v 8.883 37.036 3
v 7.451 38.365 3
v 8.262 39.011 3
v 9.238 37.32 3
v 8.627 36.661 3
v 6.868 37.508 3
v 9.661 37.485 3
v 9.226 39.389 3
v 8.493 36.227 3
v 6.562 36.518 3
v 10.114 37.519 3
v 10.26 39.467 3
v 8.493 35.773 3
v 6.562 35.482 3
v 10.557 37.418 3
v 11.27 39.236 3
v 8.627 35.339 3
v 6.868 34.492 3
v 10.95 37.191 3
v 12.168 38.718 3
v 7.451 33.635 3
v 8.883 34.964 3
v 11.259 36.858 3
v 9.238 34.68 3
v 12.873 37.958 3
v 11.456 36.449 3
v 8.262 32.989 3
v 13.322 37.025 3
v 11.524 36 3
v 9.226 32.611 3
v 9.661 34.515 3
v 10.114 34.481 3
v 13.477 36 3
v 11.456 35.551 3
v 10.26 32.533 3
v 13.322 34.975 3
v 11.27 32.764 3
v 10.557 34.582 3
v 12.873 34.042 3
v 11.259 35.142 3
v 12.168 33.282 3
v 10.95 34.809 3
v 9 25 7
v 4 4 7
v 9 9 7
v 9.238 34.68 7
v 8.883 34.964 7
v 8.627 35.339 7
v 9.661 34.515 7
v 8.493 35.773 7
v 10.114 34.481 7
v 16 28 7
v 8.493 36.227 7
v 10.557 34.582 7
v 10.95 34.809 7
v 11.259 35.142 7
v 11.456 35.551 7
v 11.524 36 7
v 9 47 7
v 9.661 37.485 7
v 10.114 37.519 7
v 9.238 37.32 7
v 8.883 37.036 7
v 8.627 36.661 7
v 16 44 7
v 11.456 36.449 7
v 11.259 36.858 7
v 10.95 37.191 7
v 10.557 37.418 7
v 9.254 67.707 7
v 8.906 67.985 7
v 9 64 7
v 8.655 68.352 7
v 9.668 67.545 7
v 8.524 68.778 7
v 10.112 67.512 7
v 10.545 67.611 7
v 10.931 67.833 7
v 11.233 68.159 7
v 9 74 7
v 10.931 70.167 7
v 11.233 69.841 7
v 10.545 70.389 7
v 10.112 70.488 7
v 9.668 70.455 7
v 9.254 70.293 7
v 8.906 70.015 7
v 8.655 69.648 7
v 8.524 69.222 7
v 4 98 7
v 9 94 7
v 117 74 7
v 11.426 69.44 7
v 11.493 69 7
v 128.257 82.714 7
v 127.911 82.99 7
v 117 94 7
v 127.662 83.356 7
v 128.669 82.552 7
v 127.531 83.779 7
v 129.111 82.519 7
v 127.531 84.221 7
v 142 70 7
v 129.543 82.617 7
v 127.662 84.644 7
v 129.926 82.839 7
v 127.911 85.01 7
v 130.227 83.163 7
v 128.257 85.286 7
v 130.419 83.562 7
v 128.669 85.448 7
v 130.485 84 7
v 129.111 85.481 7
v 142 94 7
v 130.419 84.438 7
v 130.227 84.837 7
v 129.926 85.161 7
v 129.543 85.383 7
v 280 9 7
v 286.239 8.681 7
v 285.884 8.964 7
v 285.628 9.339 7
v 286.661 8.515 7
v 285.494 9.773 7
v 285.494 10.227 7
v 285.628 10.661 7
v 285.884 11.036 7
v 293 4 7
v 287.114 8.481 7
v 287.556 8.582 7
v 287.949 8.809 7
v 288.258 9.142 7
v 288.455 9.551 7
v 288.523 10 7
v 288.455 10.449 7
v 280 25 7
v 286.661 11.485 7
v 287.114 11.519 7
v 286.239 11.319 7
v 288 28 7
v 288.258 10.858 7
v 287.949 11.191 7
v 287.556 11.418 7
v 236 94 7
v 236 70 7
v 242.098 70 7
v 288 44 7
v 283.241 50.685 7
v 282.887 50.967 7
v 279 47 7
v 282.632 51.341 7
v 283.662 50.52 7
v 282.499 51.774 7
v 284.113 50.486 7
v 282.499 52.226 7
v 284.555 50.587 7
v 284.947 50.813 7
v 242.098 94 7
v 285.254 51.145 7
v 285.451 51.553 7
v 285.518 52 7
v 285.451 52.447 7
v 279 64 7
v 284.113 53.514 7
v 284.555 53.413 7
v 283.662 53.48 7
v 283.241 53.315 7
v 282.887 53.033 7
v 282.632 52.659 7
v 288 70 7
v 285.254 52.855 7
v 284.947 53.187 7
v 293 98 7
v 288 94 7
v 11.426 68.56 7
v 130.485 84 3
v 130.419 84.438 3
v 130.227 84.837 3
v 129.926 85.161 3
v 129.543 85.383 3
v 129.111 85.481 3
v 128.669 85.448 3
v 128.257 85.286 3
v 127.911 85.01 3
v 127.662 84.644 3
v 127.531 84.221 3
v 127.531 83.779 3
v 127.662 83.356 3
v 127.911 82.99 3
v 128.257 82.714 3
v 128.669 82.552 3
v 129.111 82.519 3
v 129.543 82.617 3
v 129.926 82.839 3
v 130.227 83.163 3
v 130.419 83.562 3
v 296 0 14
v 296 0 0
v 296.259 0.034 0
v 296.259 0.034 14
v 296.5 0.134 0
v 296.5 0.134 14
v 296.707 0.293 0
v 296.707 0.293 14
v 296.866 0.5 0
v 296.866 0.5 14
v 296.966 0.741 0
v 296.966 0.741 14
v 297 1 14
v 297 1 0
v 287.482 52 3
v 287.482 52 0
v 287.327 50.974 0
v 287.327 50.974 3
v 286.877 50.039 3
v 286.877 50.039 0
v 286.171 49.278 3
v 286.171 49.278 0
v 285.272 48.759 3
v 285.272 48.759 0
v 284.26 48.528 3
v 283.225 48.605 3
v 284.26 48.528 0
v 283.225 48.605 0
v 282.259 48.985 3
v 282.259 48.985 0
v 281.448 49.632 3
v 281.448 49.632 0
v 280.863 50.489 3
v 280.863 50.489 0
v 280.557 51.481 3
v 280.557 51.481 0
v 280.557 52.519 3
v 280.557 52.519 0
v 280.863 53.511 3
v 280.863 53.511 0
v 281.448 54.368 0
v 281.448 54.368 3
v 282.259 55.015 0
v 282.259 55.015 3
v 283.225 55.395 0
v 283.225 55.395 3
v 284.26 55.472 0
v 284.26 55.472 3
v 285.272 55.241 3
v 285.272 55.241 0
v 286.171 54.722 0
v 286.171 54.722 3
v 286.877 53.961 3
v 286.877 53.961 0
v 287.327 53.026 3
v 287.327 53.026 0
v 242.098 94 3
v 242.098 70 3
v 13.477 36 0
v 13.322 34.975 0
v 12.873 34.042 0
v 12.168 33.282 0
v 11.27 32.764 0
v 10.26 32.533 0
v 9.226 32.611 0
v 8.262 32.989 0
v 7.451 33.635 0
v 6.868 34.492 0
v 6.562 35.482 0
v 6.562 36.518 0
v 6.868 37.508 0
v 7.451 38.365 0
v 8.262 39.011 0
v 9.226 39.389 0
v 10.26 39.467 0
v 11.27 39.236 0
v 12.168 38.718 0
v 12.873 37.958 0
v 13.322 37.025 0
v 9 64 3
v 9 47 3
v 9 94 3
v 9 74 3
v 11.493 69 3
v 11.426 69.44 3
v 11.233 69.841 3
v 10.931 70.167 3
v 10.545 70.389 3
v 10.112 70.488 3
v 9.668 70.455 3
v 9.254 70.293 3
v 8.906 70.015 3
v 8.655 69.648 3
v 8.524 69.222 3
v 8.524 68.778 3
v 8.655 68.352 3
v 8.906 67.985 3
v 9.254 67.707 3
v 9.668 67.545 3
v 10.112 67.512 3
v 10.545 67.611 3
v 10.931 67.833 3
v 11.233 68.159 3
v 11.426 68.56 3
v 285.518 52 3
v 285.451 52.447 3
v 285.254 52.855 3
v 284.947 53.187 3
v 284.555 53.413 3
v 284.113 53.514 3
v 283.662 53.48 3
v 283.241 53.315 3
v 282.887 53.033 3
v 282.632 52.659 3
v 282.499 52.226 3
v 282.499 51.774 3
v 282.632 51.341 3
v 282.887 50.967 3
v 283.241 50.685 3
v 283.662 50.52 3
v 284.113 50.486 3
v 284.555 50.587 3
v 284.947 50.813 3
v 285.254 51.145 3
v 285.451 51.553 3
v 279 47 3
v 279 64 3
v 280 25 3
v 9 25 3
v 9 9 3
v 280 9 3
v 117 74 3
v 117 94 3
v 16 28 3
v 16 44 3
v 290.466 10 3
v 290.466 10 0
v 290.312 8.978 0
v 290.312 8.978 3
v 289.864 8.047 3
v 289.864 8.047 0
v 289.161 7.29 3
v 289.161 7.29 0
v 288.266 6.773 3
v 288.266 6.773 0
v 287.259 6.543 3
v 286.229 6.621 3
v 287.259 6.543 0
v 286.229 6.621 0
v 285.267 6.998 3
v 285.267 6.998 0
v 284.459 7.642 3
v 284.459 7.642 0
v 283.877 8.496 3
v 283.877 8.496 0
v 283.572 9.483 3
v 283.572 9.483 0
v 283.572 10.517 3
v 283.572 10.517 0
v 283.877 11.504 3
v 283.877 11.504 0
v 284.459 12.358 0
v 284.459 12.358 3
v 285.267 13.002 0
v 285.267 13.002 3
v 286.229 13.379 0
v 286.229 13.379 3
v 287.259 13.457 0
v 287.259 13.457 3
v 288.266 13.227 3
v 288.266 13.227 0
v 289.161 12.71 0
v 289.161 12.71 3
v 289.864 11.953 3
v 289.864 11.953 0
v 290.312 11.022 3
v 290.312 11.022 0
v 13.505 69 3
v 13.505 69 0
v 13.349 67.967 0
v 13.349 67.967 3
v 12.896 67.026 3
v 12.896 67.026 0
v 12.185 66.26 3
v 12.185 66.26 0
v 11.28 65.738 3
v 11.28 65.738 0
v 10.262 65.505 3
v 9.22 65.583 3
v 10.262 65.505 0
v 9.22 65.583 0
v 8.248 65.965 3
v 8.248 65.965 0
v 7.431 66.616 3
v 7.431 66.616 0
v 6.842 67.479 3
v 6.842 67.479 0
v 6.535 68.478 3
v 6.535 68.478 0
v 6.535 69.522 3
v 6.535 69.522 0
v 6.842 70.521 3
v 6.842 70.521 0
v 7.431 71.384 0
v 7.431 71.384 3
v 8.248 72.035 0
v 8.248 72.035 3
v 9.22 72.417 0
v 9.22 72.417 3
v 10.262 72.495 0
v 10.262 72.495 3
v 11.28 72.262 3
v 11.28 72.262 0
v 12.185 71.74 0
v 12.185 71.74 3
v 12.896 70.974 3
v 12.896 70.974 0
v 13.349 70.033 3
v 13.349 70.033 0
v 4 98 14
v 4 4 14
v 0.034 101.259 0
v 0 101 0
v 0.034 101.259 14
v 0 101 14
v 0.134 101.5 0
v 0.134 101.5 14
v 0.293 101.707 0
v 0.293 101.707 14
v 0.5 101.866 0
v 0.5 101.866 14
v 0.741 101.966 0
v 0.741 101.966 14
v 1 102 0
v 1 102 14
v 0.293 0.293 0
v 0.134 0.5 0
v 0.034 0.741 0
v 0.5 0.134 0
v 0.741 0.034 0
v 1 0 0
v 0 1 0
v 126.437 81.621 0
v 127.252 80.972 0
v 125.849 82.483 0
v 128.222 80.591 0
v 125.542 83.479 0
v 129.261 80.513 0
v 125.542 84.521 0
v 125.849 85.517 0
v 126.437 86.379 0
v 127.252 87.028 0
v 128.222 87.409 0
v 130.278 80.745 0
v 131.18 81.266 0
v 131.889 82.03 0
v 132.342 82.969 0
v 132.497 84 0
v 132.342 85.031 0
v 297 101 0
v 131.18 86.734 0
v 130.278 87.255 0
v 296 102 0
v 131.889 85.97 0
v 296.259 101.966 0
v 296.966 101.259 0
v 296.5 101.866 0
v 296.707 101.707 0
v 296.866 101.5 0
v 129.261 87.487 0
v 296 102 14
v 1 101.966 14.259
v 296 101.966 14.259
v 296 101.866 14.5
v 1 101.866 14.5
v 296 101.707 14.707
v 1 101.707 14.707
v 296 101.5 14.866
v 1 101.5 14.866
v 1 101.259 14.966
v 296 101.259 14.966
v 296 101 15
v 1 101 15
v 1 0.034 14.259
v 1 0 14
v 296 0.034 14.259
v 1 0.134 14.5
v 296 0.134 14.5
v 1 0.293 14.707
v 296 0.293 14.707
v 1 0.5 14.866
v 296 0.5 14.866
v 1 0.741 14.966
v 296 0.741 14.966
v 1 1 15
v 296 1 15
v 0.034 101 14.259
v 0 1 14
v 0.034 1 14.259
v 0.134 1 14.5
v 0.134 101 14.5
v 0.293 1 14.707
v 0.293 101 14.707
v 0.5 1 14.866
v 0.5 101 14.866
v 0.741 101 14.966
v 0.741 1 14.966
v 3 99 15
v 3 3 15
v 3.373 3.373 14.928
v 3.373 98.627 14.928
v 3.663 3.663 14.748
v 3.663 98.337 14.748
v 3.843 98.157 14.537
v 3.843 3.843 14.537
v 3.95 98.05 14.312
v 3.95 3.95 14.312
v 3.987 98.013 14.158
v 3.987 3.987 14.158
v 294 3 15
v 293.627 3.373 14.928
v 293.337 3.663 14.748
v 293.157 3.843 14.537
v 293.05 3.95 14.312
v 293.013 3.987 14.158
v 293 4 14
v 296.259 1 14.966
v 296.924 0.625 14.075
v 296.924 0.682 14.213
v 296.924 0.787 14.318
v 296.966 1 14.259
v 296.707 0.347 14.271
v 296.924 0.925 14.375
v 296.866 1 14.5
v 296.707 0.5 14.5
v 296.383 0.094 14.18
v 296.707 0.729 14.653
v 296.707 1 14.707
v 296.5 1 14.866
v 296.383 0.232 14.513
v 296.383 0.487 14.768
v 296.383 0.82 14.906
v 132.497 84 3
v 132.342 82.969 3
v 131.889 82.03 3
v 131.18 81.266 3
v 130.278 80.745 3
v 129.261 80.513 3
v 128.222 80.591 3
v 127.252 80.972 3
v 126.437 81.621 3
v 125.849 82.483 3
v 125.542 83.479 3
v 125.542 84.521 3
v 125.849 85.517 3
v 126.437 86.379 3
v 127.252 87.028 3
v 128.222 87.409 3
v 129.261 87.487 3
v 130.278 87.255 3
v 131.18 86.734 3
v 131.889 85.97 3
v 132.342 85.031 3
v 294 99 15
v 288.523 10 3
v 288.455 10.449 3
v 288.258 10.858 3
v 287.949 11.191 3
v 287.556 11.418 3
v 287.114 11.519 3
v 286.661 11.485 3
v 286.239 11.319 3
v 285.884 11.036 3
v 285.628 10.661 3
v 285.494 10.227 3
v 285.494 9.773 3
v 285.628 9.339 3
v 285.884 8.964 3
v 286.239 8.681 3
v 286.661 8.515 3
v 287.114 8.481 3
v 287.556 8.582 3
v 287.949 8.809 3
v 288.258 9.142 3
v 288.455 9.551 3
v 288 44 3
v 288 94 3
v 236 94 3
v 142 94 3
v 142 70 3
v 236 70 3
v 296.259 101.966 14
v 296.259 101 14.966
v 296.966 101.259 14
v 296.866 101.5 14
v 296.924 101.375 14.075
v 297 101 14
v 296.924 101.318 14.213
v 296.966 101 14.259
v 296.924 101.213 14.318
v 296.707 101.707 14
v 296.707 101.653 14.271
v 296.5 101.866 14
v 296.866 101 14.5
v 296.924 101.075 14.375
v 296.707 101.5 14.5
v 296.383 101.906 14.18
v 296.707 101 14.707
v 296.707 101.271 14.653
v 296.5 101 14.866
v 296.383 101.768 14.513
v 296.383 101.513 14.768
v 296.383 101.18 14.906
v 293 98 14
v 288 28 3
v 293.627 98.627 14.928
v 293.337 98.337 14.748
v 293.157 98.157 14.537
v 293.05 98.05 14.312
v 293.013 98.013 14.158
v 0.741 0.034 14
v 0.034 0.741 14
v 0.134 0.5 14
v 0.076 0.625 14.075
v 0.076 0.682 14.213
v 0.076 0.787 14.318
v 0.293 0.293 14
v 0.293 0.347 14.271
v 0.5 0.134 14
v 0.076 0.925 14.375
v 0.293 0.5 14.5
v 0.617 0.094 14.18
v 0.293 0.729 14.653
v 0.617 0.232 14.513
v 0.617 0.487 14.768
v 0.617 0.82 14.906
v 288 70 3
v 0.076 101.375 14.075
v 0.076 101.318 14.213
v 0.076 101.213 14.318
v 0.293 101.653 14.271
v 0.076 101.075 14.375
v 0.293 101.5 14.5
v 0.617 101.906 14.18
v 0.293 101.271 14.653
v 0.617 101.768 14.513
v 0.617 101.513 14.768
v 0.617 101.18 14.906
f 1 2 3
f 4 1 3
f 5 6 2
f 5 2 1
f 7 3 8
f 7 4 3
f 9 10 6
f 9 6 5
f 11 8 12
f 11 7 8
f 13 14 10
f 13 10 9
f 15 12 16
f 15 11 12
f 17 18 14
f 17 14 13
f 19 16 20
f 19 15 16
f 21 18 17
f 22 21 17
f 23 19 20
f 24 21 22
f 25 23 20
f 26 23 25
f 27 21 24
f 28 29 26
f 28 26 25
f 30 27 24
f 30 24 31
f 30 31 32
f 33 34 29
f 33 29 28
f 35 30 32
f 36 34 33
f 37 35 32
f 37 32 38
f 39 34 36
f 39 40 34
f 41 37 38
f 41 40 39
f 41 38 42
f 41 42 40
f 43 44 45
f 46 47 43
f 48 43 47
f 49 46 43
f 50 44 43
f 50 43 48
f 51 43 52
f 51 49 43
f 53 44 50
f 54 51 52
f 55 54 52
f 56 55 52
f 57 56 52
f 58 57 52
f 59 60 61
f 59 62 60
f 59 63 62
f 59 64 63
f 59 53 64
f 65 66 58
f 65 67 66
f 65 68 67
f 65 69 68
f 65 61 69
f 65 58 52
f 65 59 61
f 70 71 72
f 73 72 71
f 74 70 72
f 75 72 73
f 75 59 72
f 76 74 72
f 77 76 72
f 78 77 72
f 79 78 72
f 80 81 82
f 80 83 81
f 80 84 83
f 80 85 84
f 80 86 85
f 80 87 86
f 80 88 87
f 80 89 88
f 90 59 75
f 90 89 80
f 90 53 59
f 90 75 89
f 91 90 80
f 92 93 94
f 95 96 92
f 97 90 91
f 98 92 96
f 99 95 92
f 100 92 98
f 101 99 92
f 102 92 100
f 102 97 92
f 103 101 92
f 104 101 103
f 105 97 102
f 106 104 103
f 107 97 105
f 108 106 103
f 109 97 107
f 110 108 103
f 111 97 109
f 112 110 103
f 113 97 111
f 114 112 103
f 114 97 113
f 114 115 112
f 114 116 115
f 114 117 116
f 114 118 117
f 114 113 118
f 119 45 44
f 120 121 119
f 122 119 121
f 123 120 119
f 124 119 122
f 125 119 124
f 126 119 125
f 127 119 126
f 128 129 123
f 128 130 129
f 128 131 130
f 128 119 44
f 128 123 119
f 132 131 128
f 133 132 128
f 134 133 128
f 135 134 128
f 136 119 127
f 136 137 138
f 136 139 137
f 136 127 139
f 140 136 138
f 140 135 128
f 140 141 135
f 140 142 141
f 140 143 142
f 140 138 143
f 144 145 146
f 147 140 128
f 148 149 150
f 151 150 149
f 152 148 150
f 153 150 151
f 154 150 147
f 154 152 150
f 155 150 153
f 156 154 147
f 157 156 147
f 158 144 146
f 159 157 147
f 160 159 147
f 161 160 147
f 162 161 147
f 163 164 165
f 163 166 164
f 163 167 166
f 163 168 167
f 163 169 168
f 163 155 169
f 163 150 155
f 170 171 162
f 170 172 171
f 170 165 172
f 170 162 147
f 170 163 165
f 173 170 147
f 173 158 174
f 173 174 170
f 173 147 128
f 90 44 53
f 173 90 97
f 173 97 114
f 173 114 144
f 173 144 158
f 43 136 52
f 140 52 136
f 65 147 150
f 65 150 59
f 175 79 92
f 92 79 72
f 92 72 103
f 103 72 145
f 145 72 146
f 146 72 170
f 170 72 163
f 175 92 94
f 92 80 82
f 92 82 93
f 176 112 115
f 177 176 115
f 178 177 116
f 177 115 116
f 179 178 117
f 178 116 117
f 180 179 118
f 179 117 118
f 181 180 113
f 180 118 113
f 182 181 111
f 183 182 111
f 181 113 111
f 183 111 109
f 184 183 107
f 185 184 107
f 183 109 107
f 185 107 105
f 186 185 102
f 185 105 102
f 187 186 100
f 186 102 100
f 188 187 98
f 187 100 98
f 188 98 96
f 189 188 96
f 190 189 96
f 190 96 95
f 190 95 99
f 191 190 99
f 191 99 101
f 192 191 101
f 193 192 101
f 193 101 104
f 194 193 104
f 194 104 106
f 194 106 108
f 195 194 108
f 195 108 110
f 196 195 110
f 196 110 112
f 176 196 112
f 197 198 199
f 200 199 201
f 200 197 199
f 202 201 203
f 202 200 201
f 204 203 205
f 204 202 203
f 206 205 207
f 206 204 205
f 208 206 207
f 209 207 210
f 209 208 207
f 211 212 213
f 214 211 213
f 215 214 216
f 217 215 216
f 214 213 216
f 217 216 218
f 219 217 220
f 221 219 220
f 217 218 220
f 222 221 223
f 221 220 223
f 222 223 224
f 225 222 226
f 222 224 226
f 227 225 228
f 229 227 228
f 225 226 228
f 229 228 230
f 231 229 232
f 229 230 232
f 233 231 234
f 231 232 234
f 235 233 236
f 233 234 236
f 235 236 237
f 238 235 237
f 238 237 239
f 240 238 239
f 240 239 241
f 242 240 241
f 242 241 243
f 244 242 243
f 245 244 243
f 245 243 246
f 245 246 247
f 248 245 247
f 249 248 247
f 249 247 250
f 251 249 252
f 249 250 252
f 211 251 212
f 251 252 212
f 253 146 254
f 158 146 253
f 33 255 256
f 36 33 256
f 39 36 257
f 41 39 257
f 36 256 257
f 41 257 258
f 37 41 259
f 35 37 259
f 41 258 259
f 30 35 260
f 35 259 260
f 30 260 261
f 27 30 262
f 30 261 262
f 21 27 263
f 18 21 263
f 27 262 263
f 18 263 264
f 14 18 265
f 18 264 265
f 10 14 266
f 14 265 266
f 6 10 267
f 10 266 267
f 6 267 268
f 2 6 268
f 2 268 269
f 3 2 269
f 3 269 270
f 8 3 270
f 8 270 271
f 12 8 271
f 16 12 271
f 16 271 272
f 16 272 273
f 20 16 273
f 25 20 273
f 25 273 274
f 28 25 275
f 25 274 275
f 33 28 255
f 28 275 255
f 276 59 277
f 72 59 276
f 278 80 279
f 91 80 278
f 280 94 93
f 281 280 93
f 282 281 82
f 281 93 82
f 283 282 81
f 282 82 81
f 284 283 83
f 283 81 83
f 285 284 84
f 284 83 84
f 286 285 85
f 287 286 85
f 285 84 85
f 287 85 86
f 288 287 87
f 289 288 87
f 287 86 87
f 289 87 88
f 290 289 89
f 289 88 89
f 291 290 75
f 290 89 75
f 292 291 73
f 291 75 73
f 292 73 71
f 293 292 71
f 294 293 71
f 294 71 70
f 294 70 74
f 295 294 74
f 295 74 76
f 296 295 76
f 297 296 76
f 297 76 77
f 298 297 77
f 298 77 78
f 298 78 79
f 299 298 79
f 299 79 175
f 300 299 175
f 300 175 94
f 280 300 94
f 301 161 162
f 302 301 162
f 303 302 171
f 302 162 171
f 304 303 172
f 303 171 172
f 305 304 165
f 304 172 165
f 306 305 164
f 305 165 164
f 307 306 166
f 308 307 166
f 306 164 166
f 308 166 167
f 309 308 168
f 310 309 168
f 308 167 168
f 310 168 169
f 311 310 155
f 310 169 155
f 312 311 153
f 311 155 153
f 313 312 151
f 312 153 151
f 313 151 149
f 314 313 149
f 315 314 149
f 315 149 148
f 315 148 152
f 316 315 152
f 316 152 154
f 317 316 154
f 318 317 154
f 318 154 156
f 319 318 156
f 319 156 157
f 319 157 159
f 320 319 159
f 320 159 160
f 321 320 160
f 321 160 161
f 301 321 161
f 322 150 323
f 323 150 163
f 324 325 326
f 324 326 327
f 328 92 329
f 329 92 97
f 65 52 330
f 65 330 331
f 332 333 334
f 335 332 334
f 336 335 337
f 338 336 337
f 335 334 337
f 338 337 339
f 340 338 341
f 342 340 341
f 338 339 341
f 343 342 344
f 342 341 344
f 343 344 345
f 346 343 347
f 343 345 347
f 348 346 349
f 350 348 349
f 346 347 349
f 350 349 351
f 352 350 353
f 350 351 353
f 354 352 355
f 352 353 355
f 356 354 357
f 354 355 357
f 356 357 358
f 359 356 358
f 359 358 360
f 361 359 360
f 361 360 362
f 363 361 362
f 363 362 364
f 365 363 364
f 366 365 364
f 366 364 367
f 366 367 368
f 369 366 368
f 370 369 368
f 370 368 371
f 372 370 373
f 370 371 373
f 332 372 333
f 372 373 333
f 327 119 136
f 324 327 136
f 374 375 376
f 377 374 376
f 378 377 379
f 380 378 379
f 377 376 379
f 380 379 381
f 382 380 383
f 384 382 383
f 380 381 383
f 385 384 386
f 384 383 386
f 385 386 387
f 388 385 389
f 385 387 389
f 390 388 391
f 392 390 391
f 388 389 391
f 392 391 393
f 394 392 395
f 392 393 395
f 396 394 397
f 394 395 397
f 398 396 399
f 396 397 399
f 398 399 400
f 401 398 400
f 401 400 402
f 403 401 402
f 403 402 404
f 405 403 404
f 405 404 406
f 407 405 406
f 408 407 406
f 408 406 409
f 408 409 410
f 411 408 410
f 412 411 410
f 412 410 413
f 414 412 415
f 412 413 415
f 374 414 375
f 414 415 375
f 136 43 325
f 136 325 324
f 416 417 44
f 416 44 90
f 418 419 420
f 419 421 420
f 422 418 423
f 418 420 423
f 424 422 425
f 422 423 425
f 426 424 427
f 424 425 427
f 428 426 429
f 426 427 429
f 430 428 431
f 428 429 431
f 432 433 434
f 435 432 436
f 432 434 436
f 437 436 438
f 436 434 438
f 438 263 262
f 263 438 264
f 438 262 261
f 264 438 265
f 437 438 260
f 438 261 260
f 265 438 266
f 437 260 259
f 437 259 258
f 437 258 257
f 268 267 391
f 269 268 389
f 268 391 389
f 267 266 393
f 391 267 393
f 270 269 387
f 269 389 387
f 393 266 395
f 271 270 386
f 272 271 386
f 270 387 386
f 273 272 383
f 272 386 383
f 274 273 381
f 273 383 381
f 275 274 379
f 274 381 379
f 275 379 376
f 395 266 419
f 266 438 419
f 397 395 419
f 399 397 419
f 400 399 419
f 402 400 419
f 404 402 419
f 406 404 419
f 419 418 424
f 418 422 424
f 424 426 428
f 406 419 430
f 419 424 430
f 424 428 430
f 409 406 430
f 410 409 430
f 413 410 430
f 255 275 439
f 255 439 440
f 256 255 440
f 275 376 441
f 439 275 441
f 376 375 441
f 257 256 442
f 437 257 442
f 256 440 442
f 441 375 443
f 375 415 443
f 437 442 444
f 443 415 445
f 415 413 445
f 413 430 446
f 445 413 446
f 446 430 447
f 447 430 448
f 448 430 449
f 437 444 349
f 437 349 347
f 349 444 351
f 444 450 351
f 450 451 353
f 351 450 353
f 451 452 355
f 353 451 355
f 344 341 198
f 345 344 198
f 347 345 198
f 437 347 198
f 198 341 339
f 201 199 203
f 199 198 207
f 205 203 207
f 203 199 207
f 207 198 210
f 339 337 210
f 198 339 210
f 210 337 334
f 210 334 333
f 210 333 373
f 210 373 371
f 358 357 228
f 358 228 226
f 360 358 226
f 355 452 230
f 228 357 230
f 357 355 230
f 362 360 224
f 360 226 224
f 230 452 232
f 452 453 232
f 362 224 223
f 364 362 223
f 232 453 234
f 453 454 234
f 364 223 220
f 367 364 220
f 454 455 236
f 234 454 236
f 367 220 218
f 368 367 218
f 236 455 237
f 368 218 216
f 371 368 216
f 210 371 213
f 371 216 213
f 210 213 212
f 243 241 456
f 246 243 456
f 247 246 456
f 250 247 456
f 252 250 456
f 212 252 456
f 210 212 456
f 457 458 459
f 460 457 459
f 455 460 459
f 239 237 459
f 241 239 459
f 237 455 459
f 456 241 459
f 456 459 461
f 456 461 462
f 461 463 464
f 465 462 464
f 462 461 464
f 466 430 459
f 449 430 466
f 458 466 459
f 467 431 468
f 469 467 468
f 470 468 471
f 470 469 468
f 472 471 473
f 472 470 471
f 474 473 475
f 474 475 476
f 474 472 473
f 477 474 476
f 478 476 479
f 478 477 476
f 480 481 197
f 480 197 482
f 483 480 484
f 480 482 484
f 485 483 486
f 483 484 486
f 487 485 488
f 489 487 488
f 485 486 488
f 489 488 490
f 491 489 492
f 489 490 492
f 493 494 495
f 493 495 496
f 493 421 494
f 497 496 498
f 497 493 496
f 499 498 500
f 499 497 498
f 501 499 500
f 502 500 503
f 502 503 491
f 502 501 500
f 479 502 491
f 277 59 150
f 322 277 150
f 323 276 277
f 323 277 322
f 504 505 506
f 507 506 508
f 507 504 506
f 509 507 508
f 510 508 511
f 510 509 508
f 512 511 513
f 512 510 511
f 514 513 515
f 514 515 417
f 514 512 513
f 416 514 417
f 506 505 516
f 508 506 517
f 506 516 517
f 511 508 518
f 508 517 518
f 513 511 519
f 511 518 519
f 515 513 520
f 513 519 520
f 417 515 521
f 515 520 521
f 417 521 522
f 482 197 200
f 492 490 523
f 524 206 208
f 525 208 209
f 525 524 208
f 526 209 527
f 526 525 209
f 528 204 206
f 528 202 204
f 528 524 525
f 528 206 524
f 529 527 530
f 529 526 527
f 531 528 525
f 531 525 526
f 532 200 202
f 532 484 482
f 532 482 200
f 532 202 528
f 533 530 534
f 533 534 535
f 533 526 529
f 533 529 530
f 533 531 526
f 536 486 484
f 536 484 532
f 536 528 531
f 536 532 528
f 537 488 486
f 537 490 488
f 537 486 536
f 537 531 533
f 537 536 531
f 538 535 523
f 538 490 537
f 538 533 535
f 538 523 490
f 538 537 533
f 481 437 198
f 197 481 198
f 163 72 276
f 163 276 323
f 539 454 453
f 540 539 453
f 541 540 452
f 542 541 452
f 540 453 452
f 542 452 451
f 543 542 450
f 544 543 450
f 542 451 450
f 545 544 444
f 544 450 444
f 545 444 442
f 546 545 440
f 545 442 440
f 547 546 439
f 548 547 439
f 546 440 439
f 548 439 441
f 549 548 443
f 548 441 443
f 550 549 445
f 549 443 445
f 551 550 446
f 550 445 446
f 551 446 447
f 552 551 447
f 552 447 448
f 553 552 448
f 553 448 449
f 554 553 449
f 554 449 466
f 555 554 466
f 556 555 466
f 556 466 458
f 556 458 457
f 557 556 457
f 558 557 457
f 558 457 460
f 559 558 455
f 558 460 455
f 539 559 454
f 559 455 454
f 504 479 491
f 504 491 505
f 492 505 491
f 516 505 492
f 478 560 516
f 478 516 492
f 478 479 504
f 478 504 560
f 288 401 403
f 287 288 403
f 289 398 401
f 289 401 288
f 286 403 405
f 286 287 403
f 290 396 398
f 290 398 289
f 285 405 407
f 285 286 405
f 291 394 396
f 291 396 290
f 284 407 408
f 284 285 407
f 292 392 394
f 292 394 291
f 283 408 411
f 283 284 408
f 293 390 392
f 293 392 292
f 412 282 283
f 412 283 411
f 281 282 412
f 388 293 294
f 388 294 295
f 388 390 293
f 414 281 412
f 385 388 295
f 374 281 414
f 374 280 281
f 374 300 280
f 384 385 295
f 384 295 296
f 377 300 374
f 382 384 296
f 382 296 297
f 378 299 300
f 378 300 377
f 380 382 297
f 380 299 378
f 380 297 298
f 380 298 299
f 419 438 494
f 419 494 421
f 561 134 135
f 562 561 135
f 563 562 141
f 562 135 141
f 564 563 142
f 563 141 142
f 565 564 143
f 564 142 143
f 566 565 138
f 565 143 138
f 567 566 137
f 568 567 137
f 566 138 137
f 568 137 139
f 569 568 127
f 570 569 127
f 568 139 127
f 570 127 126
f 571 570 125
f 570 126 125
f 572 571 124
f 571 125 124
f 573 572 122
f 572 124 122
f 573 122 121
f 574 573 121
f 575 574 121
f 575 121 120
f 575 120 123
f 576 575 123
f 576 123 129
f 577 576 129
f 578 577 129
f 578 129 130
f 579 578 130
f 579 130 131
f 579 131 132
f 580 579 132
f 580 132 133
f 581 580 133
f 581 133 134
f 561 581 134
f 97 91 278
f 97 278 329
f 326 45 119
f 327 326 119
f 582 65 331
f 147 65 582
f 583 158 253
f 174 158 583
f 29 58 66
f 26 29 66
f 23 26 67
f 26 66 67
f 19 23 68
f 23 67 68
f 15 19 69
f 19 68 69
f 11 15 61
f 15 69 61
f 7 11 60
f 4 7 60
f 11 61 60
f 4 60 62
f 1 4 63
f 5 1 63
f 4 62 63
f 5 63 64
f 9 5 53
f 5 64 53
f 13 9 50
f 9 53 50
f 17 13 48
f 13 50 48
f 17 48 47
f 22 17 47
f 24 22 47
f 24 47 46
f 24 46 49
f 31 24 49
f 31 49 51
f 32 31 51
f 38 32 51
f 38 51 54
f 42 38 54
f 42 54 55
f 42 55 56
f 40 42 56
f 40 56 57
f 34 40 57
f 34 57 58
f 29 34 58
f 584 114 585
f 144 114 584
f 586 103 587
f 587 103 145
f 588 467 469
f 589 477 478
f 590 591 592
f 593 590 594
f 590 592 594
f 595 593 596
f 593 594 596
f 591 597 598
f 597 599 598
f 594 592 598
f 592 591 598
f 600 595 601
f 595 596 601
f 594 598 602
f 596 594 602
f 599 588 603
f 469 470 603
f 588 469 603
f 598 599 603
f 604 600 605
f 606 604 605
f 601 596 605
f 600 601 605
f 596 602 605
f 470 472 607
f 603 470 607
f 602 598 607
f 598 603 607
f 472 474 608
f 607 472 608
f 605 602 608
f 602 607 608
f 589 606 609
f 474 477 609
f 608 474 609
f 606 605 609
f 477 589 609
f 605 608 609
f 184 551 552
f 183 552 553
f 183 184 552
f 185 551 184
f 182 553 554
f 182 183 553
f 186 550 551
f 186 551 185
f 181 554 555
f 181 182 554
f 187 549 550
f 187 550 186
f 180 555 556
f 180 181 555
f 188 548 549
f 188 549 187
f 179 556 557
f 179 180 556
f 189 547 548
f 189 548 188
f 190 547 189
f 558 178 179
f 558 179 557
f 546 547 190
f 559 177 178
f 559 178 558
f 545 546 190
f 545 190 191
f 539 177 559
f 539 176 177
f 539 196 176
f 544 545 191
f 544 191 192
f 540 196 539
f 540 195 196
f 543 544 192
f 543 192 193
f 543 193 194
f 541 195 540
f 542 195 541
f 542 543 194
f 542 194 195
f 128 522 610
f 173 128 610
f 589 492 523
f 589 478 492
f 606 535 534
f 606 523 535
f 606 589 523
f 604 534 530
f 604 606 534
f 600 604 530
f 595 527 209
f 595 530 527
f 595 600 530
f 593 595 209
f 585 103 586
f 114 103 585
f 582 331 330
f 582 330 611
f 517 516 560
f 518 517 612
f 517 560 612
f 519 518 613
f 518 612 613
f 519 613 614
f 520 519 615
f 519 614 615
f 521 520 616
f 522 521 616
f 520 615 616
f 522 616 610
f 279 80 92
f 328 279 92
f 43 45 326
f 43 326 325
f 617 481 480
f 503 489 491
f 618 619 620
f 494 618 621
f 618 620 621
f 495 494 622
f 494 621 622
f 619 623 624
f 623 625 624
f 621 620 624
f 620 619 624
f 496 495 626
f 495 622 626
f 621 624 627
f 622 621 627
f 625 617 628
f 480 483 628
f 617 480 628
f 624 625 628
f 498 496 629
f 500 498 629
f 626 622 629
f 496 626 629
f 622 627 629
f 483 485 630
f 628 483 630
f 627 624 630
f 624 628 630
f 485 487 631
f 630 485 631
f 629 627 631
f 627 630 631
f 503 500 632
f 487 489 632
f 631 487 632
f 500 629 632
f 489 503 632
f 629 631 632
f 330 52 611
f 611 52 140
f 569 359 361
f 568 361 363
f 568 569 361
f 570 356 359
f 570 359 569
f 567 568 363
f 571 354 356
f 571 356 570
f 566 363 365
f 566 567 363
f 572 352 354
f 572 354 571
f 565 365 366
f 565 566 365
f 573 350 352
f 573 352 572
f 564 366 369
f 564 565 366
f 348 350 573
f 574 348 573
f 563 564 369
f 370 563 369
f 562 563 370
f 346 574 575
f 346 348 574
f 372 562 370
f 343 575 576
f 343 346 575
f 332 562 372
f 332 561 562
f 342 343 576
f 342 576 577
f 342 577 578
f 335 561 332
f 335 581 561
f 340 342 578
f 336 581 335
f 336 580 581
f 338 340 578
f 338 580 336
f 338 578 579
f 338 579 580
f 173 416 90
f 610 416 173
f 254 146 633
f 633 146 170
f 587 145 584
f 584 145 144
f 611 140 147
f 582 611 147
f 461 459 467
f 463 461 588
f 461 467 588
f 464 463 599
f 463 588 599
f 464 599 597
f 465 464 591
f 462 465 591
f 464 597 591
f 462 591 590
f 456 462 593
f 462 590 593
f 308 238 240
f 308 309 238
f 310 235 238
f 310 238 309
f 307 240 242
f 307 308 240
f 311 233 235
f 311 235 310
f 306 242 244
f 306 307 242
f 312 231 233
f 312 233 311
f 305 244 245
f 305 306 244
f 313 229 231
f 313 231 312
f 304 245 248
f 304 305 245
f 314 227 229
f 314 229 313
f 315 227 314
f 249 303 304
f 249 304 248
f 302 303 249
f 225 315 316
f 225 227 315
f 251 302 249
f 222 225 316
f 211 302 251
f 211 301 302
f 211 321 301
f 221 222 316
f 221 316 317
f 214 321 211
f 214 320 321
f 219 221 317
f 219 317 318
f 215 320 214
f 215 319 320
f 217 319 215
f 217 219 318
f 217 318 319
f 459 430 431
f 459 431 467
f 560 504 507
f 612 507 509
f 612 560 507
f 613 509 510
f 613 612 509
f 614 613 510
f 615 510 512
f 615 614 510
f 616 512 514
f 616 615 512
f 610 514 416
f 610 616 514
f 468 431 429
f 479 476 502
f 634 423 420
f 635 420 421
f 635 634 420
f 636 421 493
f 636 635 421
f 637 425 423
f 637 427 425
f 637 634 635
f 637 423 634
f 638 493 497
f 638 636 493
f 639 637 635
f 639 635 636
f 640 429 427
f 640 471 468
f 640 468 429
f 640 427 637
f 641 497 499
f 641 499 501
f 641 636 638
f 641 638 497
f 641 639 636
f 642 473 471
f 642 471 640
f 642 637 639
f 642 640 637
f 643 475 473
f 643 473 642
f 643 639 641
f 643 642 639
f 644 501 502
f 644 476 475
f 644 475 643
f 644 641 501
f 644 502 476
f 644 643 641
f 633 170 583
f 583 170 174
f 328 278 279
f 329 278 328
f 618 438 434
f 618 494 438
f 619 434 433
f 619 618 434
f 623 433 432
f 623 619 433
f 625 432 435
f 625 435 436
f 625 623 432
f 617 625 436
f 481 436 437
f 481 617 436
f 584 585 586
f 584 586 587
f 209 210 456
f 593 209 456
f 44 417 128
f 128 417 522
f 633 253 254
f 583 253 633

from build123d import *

# Parameters (mm, degrees)
SKETCH_W        = 297
SKETCH_H        = 102
PAD_DEPTH       = 15
SKETCH001_W     = 289
SKETCH001_H     = 94
POCKET_DEPTH    = 8
SKETCH002_W     = 271
SKETCH002_H     = 16
SKETCH002_W_2   = 272
SKETCH002_W_3   = 270
SKETCH002_H_2   = 17
SKETCH002_W_4   = 45.901761
SKETCH002_H_3   = 24
SKETCH002_W_5   = 94
SKETCH002_W_6   = 108
SKETCH002_H_4   = 20
POCKET001_DEPTH = 4
SKETCH003_R     = 1.51818
SKETCH003_R_2   = 1.523657
SKETCH003_R_3   = 1.522766
SKETCH003_R_4   = 1.49253
SKETCH003_R_5   = 1.485367
POCKET002_DEPTH = 15
SKETCH004_R     = 3.476644
SKETCH004_R_2   = 3.504577
SKETCH004_R_3   = 3.496918
SKETCH004_R_4   = 3.4664
SKETCH004_R_5   = 3.481812
POCKET003_DEPTH = 3
FILLET_R        = 1
FILLET001_R     = 1


with BuildPart() as part:
    # Sketch → Pad (new body)
    with BuildSketch(Plane.XY):
        with Locations((148.5, 51)):
            Rectangle(SKETCH_W, SKETCH_H)
    extrude(amount=PAD_DEPTH)

    # Sketch001 → Pocket (cut)
    with BuildSketch(Plane.XY.offset(15)):
        with Locations((148.5, 51)):
            Rectangle(SKETCH001_W, SKETCH001_H)
    extrude(amount=-POCKET_DEPTH, mode=Mode.SUBTRACT)

    # Sketch002 → Pocket001 (cut)
    with BuildSketch(Plane.XY.offset(7)):
        with Locations((144.5, 17)):
            Rectangle(SKETCH002_W, SKETCH002_H)
        with Locations((152, 36)):
            Rectangle(SKETCH002_W_2, SKETCH002_H)
        with Locations((144, 55.5)):
            Rectangle(SKETCH002_W_3, SKETCH002_H_2)
        with Locations((265.049119, 82)):
            Rectangle(SKETCH002_W_4, SKETCH002_H_3)
        with Locations((189, 82)):
            Rectangle(SKETCH002_W_5, SKETCH002_H_3)
        with Locations((63, 84)):
            Rectangle(SKETCH002_W_6, SKETCH002_H_4)
    extrude(amount=-POCKET001_DEPTH, mode=Mode.SUBTRACT)

    # Sketch003 → Pocket002 (cut)
    with BuildSketch(Plane.XY.offset(7)):
        with Locations((284, 52)):
            Circle(SKETCH003_R)
        with Locations((10, 36)):
            Circle(SKETCH003_R_2)
        with Locations((287, 10)):
            Circle(SKETCH003_R_3)
        with Locations((10, 69)):
            Circle(SKETCH003_R_4)
        with Locations((129, 84)):
            Circle(SKETCH003_R_5)
    extrude(amount=-POCKET002_DEPTH, mode=Mode.SUBTRACT)

    # Sketch004 → Pocket003 (cut)
    with BuildSketch(Plane(origin=(0, 0, 0), x_dir=(1, 0, 0), z_dir=(0, 0, -1))):
        with Locations((10, -36)):
            Circle(SKETCH004_R)
        with Locations((10, -69)):
            Circle(SKETCH004_R_2)
        with Locations((129, -84)):
            Circle(SKETCH004_R_3)
        with Locations((287, -10)):
            Circle(SKETCH004_R_4)
        with Locations((284, -52)):
            Circle(SKETCH004_R_5)
    extrude(amount=-POCKET003_DEPTH, mode=Mode.SUBTRACT)

    # Fillet
    fillet_edges = [part.edges().sort_by_distance(p)[0] for p in [
        (148.5, 102, 15),
        (297, 102, 7.5),
        (0, 102, 7.5),
        (148.5, 0, 15),
        (297, 0, 7.5),
        (0, 0, 7.5),
        (0, 51, 15),
        (297, 51, 15),
    ]]
    fillet(fillet_edges, radius=FILLET_R)

    # Fillet001
    fillet001_edges = [part.edges().sort_by_distance(p)[0] for p in [
        (148.5, 98, 15),
        (4, 51, 15),
        (148.5, 4, 15),
        (293, 51, 15),
    ]]
    fillet(fillet001_edges, radius=FILLET001_R)


solid = part.part
